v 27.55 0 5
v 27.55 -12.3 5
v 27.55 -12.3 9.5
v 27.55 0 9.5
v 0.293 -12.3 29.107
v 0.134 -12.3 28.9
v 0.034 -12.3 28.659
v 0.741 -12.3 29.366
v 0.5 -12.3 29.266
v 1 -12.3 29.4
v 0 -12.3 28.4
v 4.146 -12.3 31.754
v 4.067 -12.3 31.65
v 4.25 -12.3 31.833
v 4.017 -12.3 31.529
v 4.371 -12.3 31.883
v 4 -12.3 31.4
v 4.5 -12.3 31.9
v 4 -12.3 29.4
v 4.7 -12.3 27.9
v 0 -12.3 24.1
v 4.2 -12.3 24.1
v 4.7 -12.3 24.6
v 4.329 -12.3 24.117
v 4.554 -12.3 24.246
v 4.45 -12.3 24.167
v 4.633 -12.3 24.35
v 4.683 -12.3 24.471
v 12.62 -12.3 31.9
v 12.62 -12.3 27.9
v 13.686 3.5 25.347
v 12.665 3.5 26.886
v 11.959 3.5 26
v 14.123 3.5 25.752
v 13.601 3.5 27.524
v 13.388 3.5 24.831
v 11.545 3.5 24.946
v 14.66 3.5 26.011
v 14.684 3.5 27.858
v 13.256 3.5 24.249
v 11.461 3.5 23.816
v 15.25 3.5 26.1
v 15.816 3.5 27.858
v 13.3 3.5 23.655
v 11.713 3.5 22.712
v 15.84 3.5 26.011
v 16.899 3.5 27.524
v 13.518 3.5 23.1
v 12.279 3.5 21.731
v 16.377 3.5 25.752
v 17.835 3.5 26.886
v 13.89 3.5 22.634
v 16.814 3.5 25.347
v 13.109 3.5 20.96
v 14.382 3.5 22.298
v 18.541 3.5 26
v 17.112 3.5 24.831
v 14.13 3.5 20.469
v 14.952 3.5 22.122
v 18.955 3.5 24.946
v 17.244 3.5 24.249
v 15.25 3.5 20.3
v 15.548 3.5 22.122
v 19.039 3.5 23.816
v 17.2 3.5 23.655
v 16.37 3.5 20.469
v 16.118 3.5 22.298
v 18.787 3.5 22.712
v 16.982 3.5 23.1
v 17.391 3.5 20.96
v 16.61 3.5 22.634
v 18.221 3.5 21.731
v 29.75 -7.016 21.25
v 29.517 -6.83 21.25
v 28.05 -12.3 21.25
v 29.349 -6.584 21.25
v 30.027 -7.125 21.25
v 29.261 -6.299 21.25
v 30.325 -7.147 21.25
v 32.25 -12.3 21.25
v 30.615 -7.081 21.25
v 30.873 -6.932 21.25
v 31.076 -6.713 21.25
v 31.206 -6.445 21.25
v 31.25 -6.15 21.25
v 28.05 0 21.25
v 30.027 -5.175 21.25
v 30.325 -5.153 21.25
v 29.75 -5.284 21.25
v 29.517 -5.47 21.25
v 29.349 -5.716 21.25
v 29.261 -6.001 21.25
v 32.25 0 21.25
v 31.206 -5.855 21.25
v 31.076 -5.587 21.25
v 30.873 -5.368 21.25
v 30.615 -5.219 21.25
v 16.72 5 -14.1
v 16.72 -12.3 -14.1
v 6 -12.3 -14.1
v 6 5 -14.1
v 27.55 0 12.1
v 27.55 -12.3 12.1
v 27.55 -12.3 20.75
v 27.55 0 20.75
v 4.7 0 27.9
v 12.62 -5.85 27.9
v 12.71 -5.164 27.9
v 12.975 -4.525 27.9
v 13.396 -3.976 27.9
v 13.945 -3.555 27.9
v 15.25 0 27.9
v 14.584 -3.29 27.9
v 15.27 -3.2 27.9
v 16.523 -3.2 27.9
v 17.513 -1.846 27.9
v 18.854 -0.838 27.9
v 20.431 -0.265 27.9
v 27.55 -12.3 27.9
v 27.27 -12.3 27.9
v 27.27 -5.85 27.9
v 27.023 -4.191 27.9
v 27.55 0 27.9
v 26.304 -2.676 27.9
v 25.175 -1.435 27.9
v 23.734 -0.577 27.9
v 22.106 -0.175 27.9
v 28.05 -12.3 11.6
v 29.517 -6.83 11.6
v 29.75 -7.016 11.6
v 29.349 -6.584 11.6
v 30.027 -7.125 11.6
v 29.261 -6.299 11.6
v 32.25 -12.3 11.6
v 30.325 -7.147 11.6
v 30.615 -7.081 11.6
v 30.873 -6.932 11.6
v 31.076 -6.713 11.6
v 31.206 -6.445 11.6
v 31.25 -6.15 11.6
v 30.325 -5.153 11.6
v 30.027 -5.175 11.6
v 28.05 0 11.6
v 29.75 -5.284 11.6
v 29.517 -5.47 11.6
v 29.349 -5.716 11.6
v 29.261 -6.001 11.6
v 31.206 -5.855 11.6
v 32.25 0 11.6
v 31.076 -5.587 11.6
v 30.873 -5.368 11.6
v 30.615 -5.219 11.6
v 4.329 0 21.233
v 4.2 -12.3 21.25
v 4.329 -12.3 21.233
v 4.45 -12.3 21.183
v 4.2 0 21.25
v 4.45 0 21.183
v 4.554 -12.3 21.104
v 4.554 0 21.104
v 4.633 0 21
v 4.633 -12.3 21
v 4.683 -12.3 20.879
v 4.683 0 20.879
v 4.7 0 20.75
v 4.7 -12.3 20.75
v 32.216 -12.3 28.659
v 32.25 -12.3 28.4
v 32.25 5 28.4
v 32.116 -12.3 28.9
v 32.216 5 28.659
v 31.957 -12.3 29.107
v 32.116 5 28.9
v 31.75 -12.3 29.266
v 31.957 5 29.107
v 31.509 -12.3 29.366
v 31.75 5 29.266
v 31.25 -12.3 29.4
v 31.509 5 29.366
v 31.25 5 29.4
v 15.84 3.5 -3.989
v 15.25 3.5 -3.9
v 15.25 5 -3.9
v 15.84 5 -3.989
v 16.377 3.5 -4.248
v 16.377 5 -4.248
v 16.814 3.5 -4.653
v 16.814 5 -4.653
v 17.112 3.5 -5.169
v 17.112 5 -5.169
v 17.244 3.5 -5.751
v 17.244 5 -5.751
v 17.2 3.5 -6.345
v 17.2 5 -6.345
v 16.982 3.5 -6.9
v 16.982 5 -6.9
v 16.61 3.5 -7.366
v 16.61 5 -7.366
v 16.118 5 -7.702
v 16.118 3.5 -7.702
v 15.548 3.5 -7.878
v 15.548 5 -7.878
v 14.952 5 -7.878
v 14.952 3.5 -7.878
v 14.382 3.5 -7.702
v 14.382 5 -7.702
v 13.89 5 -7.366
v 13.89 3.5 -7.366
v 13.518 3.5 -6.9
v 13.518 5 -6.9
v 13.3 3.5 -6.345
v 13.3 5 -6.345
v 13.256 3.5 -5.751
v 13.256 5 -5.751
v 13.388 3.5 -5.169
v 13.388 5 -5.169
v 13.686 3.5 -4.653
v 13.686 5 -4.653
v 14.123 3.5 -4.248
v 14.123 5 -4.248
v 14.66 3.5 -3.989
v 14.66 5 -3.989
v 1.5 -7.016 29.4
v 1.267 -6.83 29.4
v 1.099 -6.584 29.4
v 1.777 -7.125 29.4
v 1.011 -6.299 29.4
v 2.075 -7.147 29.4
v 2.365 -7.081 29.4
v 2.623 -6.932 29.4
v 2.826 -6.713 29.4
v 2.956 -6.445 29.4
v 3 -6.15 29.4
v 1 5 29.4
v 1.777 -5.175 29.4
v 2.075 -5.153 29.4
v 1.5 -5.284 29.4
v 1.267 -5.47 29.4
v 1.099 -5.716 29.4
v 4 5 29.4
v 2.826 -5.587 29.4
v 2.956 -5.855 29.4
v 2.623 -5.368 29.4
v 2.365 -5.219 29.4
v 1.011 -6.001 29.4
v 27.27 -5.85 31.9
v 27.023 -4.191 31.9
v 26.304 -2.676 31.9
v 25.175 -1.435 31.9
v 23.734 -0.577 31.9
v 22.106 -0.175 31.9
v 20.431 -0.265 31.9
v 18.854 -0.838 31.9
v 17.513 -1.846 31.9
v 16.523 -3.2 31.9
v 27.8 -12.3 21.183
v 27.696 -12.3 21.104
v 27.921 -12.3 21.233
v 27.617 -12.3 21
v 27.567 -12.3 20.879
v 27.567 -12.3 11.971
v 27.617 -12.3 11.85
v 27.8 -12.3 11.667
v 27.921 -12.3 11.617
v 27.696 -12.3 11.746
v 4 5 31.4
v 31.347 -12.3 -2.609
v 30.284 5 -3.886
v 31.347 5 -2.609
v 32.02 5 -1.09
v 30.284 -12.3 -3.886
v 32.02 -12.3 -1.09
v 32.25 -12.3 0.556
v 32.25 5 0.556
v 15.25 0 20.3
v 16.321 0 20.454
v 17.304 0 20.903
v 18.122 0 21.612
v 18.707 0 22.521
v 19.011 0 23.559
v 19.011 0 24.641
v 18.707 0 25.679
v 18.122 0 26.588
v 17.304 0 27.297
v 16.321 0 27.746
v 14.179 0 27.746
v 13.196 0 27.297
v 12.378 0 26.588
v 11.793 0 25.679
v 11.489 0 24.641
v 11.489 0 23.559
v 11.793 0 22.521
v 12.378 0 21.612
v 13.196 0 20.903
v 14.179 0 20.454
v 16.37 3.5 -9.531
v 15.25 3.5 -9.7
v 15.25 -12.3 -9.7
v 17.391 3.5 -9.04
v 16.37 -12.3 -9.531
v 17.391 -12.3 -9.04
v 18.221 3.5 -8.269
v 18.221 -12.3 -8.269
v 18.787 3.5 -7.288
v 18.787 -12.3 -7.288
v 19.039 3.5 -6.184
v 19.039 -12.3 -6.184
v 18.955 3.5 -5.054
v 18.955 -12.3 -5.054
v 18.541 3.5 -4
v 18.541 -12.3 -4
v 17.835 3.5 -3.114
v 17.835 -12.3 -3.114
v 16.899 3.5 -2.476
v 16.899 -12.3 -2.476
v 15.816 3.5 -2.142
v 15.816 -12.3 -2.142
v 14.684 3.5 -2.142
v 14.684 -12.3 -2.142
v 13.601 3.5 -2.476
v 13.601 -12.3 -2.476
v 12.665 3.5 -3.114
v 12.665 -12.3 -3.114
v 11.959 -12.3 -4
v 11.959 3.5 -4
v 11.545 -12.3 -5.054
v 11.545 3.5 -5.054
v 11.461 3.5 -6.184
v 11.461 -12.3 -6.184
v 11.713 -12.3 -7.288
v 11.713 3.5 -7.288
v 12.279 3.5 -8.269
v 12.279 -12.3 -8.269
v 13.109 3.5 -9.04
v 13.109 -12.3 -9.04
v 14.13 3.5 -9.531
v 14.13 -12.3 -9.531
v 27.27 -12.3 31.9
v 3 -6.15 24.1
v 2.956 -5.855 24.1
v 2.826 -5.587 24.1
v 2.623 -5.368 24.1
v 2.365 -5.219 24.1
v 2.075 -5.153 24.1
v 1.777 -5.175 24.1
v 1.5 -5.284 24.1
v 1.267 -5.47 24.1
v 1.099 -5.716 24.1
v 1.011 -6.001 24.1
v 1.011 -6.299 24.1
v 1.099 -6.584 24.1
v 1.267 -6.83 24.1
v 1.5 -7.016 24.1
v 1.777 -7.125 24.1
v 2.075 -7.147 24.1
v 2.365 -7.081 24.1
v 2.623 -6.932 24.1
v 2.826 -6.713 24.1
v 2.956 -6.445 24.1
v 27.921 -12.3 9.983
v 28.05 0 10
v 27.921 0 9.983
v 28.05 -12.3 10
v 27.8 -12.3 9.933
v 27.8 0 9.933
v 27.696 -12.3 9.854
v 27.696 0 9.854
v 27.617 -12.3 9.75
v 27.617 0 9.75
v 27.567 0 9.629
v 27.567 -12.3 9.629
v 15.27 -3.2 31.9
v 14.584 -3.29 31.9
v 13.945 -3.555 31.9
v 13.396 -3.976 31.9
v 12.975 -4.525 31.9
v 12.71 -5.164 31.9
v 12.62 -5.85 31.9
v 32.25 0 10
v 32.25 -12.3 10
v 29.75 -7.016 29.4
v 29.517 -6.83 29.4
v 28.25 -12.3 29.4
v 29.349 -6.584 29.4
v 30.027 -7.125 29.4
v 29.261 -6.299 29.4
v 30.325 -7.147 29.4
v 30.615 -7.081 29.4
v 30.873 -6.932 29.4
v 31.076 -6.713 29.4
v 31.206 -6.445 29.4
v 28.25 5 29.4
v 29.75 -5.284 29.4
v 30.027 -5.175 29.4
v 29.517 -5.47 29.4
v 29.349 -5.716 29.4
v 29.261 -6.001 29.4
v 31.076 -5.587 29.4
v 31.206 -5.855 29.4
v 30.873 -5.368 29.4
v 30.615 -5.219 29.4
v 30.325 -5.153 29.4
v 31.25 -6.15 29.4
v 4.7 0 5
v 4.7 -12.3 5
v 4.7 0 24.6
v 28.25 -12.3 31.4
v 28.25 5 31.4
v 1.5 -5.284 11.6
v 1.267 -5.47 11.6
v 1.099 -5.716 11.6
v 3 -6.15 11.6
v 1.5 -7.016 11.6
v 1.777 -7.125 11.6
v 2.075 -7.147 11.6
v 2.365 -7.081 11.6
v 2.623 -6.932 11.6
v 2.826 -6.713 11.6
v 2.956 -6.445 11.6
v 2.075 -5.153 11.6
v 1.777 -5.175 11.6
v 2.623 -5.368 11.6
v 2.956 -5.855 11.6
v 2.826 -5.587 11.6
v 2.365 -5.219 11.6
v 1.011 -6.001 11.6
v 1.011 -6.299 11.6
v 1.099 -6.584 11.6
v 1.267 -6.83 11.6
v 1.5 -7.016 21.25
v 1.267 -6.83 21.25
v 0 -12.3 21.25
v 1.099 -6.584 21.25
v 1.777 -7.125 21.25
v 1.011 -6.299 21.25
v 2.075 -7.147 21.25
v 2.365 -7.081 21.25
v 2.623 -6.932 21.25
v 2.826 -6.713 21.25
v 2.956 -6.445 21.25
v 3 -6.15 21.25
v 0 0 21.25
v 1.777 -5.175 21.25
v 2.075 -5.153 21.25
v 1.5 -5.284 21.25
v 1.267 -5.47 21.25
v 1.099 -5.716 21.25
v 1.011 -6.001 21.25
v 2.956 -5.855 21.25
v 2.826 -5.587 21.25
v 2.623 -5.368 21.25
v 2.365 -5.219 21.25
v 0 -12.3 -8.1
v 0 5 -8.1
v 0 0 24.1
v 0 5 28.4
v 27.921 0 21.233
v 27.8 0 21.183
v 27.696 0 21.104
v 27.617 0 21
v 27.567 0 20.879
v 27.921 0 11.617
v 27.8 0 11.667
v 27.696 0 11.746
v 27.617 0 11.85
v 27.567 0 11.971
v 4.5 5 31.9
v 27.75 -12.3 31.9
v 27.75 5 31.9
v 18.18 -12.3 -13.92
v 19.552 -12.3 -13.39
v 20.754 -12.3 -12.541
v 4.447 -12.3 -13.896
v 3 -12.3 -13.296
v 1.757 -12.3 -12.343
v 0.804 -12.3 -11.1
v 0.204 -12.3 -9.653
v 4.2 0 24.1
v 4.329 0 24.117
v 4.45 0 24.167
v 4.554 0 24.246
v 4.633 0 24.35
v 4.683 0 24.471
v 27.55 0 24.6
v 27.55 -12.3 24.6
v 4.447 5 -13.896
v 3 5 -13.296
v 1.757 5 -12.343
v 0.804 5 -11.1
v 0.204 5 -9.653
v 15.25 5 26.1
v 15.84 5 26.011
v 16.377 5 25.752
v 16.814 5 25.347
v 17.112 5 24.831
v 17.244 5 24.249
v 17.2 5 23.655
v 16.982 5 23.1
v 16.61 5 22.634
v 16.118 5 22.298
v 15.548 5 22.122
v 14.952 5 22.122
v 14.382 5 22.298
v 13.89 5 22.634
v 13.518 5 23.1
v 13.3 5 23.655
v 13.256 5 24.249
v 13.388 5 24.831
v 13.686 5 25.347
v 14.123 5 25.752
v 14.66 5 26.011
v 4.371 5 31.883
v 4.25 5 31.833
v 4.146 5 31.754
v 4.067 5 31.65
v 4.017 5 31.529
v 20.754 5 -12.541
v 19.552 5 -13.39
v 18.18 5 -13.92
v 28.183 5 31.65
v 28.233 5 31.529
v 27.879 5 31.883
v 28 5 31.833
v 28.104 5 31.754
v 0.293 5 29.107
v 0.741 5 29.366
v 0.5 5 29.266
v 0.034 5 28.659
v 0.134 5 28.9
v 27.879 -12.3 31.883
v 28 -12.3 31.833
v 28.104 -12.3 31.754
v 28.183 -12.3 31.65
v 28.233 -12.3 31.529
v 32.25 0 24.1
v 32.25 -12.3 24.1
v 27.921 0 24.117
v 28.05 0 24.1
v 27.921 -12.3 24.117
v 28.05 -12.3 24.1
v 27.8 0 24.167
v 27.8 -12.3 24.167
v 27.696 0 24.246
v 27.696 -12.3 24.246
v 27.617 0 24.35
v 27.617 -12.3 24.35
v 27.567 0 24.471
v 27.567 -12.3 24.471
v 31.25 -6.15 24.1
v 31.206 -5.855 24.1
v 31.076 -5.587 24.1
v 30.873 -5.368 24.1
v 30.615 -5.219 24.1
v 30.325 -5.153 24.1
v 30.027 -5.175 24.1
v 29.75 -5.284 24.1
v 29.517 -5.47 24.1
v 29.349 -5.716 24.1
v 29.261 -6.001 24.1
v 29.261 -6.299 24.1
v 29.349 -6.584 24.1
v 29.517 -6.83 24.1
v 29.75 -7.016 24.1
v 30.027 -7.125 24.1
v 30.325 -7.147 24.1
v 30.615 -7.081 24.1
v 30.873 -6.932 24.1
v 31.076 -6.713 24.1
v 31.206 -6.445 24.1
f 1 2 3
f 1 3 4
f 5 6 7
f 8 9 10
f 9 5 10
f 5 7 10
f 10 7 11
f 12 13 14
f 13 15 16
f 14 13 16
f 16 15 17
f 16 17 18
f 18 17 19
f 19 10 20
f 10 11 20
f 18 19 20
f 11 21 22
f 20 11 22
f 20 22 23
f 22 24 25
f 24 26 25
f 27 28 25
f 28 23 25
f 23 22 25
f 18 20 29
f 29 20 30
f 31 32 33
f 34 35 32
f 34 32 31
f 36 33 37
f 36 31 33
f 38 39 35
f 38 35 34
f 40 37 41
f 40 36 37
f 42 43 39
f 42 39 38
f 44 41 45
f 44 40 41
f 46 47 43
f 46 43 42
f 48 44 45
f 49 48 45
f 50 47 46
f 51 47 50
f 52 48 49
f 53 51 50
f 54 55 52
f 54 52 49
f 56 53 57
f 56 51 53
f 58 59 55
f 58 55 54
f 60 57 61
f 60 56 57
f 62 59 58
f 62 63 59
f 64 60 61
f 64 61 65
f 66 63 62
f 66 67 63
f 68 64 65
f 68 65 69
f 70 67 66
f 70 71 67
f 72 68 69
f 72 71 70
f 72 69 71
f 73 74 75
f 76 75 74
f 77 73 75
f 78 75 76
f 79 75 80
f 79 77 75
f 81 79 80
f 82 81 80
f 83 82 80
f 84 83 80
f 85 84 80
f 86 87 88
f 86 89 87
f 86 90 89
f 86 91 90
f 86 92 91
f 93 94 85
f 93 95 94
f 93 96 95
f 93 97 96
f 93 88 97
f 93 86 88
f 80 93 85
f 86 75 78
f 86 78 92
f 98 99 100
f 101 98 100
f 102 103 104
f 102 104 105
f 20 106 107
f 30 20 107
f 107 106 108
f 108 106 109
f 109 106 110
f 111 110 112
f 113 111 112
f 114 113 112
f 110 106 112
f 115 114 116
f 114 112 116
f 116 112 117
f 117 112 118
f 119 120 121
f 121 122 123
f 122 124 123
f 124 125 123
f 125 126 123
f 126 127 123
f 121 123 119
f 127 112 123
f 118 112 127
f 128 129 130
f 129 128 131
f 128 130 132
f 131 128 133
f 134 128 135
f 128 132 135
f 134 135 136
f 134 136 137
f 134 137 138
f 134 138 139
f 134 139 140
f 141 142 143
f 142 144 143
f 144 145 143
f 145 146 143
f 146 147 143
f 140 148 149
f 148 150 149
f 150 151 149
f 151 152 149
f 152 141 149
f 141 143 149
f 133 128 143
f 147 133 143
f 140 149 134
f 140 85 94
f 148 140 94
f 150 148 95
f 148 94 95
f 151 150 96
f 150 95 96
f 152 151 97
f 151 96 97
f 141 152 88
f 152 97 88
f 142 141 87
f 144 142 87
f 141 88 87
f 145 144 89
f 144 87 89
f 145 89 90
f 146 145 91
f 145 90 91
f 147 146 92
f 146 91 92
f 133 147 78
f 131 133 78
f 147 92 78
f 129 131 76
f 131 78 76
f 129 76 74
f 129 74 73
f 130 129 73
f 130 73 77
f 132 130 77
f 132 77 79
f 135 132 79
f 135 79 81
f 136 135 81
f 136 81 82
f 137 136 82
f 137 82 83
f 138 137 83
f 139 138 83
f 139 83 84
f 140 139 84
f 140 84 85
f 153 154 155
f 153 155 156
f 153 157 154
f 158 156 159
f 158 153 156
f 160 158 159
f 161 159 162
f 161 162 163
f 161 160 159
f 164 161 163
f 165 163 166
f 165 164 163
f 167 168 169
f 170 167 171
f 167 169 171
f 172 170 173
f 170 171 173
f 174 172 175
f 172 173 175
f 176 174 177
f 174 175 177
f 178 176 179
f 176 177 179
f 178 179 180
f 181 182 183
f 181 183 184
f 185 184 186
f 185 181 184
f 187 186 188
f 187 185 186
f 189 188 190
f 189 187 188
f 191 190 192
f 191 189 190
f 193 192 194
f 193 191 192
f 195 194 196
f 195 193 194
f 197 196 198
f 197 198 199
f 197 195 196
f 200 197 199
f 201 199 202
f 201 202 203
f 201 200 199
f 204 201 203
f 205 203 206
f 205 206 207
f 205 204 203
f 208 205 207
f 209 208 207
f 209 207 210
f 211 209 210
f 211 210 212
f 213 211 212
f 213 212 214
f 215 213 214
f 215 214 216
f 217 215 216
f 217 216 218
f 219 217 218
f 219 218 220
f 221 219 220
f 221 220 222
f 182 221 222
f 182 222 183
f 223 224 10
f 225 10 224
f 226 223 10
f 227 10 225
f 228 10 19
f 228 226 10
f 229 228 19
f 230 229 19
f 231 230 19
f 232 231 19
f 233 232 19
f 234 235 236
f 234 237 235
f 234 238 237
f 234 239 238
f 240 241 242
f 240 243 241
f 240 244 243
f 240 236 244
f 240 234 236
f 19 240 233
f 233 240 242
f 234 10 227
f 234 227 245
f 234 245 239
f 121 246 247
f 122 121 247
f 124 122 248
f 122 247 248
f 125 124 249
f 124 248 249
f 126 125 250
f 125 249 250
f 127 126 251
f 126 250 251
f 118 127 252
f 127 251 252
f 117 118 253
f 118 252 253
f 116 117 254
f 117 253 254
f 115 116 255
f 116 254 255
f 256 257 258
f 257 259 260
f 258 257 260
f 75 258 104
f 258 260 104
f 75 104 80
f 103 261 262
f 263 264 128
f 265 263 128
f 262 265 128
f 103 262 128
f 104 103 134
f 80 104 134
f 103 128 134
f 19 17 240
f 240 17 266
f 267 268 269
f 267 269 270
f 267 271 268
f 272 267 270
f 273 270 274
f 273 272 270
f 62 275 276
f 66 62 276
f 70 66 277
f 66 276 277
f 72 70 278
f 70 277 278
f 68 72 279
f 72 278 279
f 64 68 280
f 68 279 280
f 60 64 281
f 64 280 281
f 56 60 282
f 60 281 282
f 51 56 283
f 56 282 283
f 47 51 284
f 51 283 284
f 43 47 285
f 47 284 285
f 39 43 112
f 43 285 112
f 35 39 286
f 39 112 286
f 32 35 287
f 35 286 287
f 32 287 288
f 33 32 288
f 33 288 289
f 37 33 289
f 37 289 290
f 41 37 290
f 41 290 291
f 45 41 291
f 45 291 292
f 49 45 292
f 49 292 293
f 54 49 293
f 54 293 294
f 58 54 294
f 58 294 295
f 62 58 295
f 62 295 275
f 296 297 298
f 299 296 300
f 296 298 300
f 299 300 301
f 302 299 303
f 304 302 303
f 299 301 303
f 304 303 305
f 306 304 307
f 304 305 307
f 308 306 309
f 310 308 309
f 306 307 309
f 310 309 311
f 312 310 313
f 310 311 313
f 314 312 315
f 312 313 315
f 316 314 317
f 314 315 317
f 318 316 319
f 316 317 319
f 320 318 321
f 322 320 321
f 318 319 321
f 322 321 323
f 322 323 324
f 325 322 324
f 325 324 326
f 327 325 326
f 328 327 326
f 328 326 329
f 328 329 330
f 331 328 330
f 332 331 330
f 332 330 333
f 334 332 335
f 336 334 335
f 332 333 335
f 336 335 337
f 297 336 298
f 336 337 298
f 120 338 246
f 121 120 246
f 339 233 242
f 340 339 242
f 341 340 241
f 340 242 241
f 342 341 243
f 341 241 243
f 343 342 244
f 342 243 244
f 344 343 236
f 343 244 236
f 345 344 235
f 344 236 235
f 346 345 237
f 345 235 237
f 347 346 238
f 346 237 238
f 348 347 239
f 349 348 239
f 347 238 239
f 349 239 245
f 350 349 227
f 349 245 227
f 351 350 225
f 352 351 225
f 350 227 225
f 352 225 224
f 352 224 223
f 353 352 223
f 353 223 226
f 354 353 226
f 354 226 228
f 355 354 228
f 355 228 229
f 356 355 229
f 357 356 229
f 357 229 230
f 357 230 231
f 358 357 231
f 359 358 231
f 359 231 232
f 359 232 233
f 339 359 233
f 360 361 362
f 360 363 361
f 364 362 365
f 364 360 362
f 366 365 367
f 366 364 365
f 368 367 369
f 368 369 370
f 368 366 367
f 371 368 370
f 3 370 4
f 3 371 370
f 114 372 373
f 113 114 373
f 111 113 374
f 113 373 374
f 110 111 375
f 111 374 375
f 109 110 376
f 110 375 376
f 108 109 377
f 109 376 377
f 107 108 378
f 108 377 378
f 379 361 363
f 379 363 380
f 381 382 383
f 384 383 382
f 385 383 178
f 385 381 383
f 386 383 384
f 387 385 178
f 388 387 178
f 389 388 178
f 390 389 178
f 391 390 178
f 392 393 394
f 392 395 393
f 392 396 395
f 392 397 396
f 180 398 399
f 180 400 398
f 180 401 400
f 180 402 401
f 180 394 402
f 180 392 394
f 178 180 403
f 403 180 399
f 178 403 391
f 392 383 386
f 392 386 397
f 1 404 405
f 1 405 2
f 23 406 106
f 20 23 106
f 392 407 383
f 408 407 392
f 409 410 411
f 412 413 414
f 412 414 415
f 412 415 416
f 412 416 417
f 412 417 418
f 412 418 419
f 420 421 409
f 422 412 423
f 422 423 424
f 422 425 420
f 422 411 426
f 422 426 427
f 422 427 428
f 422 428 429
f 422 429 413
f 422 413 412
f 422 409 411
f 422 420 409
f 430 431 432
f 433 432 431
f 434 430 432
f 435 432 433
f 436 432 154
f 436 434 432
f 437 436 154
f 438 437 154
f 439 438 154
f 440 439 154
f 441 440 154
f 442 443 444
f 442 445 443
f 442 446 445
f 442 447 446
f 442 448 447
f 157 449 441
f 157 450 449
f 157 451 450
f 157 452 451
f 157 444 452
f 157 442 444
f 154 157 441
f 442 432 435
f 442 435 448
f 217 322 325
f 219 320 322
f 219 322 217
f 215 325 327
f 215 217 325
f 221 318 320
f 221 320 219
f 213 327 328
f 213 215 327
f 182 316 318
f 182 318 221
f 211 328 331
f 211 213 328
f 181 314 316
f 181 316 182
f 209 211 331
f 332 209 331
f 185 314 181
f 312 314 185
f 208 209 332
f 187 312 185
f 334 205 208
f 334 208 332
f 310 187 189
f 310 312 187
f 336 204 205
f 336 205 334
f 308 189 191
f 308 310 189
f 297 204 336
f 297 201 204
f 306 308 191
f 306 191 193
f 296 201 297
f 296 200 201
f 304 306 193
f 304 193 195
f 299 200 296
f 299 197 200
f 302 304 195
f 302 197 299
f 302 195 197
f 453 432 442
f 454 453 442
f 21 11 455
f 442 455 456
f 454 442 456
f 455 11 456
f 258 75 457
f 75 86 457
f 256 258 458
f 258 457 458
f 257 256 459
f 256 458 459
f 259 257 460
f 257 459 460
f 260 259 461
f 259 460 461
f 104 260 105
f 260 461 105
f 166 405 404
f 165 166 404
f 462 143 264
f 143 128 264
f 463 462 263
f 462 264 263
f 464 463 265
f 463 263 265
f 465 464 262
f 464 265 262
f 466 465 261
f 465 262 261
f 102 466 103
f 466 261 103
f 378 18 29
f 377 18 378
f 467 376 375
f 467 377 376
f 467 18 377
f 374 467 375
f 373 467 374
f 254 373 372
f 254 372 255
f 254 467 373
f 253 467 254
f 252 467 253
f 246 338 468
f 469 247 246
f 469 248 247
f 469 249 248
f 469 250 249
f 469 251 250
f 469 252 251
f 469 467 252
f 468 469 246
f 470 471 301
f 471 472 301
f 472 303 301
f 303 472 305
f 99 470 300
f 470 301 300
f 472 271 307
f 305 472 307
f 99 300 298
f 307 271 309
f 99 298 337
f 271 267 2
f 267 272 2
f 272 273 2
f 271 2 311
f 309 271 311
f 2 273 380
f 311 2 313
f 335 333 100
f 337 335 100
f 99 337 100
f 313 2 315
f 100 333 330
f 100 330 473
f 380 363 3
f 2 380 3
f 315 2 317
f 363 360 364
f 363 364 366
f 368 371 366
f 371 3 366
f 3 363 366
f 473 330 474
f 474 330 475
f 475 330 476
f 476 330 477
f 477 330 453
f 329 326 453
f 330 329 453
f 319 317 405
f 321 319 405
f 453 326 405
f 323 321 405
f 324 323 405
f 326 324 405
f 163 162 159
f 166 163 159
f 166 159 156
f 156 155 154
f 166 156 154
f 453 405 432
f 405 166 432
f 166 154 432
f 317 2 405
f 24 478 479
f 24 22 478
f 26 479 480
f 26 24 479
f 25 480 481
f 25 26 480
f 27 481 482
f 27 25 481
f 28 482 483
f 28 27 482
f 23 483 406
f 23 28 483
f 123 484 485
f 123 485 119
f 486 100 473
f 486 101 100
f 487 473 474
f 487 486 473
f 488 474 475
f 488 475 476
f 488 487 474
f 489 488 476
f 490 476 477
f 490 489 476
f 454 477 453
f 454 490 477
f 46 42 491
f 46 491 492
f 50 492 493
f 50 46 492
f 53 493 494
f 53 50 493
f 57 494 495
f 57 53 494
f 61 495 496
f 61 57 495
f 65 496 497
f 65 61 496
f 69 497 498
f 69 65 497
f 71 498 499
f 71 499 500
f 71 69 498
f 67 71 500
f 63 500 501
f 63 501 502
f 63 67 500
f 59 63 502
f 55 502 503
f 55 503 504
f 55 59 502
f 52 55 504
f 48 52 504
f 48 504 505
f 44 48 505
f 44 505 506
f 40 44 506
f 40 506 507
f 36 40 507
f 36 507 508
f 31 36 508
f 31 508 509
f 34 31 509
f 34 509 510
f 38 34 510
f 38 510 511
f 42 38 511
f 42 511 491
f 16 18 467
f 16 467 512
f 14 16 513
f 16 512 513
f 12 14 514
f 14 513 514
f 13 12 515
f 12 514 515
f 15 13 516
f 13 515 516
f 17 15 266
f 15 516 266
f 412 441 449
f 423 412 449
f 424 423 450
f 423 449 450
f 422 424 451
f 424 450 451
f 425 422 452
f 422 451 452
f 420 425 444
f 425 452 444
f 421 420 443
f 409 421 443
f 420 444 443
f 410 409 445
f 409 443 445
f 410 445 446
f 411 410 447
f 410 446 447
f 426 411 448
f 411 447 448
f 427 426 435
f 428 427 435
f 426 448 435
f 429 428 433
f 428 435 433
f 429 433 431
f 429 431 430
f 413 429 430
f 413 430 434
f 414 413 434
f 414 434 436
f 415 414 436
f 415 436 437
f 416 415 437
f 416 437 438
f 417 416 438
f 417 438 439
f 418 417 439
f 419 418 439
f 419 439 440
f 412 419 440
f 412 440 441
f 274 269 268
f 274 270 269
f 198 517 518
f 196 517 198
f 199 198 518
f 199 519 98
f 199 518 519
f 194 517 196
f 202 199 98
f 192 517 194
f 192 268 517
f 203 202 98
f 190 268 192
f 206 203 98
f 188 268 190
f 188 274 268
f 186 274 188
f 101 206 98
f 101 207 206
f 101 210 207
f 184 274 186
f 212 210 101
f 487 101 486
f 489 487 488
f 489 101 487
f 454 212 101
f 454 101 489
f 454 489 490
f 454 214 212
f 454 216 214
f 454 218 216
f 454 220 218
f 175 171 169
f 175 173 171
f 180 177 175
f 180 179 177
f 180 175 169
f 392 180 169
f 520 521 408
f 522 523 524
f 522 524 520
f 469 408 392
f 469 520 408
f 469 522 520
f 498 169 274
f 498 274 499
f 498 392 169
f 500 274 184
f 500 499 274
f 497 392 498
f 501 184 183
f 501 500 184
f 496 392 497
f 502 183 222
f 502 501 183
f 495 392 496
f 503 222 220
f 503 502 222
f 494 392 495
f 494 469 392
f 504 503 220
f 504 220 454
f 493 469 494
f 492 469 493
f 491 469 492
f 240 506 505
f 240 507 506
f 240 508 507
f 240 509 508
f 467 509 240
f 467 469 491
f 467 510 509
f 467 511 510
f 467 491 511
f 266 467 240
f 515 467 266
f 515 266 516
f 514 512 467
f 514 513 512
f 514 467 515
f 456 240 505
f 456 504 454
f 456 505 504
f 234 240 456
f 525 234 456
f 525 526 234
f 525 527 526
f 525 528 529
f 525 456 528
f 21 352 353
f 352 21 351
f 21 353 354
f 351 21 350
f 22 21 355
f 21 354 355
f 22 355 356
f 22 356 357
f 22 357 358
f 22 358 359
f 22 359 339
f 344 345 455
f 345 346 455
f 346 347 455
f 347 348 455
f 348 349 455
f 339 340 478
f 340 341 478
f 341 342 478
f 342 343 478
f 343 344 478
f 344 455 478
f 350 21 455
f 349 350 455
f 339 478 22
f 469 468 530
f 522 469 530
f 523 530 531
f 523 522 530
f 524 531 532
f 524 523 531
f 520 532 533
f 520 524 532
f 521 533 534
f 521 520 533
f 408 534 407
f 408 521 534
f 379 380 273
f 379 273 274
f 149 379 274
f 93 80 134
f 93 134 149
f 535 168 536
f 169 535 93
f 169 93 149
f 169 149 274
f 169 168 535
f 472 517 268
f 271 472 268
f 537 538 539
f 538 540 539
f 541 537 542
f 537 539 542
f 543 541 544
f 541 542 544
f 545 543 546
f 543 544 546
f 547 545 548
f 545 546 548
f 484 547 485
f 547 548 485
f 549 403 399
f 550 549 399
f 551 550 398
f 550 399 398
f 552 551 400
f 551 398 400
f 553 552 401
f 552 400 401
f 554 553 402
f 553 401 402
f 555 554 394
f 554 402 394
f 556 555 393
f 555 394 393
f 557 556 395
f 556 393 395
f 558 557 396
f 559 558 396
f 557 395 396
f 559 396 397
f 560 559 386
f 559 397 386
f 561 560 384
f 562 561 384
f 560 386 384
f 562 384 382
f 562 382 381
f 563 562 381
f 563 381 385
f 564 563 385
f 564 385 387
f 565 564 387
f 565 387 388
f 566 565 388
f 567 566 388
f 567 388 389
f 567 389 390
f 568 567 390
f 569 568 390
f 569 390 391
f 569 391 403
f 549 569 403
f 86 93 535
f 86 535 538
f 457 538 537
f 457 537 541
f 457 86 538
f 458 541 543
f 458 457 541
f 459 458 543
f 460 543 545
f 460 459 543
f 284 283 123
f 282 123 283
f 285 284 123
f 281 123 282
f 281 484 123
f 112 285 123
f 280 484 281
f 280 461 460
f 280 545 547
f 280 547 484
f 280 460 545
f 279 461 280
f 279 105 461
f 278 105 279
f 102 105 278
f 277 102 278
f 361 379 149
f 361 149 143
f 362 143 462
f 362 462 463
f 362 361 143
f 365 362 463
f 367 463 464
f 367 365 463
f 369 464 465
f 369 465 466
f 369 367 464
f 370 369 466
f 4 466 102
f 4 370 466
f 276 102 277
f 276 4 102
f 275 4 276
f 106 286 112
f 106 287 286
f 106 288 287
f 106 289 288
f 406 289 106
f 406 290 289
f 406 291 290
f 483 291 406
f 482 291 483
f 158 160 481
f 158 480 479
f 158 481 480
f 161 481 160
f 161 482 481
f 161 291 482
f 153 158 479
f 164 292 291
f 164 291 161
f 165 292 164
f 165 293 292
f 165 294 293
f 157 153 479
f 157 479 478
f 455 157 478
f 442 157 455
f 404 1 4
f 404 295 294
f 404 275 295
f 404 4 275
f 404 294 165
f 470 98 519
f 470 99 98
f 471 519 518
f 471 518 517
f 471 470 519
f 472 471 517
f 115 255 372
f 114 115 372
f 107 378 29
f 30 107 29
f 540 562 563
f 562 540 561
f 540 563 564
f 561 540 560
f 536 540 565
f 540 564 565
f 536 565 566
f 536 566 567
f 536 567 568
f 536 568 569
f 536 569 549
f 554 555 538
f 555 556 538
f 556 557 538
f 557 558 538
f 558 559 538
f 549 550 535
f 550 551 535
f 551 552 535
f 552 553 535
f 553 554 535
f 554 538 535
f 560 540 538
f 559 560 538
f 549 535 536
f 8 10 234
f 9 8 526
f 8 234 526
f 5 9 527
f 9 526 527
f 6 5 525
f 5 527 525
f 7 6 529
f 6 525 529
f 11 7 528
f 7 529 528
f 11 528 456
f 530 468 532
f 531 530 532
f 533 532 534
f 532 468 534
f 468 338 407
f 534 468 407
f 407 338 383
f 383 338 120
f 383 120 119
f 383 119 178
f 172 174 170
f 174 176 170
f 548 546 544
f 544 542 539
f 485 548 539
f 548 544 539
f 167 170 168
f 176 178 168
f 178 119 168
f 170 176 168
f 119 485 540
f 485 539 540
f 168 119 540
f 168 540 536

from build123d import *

# Parameters (mm, degrees)
ESQUISSE1_W              = 32.25
ESQUISSE1_H              = 12.3
BOSS_EXTRU_1_DEPTH       = 5
ESQUISSE2_W              = 4.7
ESQUISSE2_H              = 12.3
BOSS_EXTRU_2_DEPTH       = 16.25
ESQUISSE5_W              = 32.25
ESQUISSE5_H              = 5
BOSS_EXTRU_4_DEPTH       = 27.9
ESQUISSE6_W              = 4.7
ESQUISSE6_H              = 3.8
BOSS_EXTRU_5_DEPTH       = 12.3
ESQUISSE7_W              = 32.25
ESQUISSE7_H              = 17.3
BOSS_EXTRU_6_DEPTH       = 4
ENL_V_MAT_EXTRU_2_DEPTH  = 4.3
ENL_V_START              = -12.3
ESQUISSE9_W              = 4.7
ESQUISSE9_H              = 1.6
ENL_V_MAT_EXTRU_3_DEPTH  = 12.3
ESQUISSE10_R             = 1
ENL_V_MAT_EXTRU_4_DEPTH  = 20.3
ESQUISSE16_W             = 32.25
ESQUISSE16_H             = 17.3
BOSS_EXTRU_8_DEPTH       = 14.1
ENL_V_START_2            = -17.3
ESQUISSE18_R             = 2
ENL_V_MAT_EXTRU_8_DEPTH  = 17.3
CONG_4_R                 = 6
ESQUISSE19_R             = 3.8
ENL_V_MAT_EXTRU_9_DEPTH  = 15.8
ESQUISSE20_W             = 4
ESQUISSE20_H             = 17.3
ENL_V_MAT_EXTRU_10_DEPTH = 2.5
ENL_V_MAT_EXTRU_11_DEPTH = 17.3
CONG_5_R                 = 6
CONG_6_R                 = 6
CONG_7_R                 = 1
CONG_8_R                 = 1
CONG_9_R                 = 0.5
CONG_10_R                = 0.5
CONG_11_R                = 0.5


with BuildPart() as part:
    # Esquisse1 → Boss.-Extru.1 (new body)
    with BuildSketch(Plane.XY):
        with Locations((16.125, -6.15)):
            Rectangle(ESQUISSE1_W, ESQUISSE1_H)
    extrude(amount=BOSS_EXTRU_1_DEPTH)

    # Esquisse2 → Boss.-Extru.2 (add)
    with BuildSketch(Plane.XY.offset(5)):
        with Locations((2.35, -6.15)):
            Rectangle(ESQUISSE2_W, ESQUISSE2_H)
        with Locations((29.9, -6.15)):
            Rectangle(ESQUISSE2_W, ESQUISSE2_H)
    extrude(amount=BOSS_EXTRU_2_DEPTH)

    # Esquisse5 → Boss.-Extru.4 (add)
    with BuildSketch(Plane(origin=(0, 0, 0), x_dir=(-1, 0, 0), z_dir=(0, 0, -1))):
        with Locations((-16.125, 2.5)):
            Rectangle(ESQUISSE5_W, ESQUISSE5_H)
    extrude(amount=-BOSS_EXTRU_4_DEPTH)

    # Esquisse6 → Boss.-Extru.5 (add)
    with BuildSketch(Plane.XZ):
        with Locations((29.9, 26)):
            Rectangle(ESQUISSE6_W, ESQUISSE6_H)
        with Locations((2.35, 26)):
            Rectangle(ESQUISSE6_W, ESQUISSE6_H)
    extrude(amount=BOSS_EXTRU_5_DEPTH)

    # Esquisse7 → Boss.-Extru.6 (add)
    with BuildSketch(Plane.XY.offset(27.9)):
        with Locations((16.125, -3.65)):
            Rectangle(ESQUISSE7_W, ESQUISSE7_H)
    extrude(amount=BOSS_EXTRU_6_DEPTH)

    # Esquisse8 → Enlèv. mat.-Extru.2 (cut)
    with BuildSketch(Plane.XY.offset(31.9)):
        with BuildLine():
            Line((12.62, -5.85), (12.62, -12.3))
            Line((12.62, -12.3), (27.27, -12.3))
            Line((27.27, -12.3), (27.27, -5.85))
            ThreePointArc((27.27, -5.85), (22.934690305, -0.315777347), (16.523466536, -3.2))
            Line((16.523466536, -3.2), (15.27, -3.2))
            ThreePointArc((15.27, -3.2), (13.39616703, -3.97616703), (12.62, -5.85))
        make_face()
    extrude(amount=-ENL_V_MAT_EXTRU_2_DEPTH, mode=Mode.SUBTRACT)

    # Esquisse9 → Enlèv. mat.-Extru.3 (cut)
    with BuildSketch(Plane.XZ.offset(12.3).offset(ENL_V_START)):
        with Locations((29.9, 10.8)):
            Rectangle(ESQUISSE9_W, ESQUISSE9_H)
    extrude(amount=ENL_V_MAT_EXTRU_3_DEPTH, mode=Mode.SUBTRACT)

    # Esquisse10 → Enlèv. mat.-Extru.4 (cut)
    with BuildSketch(Plane.XY.offset(31.9)):
        with Locations((30.25, -6.15)):
            Circle(ESQUISSE10_R)
        with Locations((2, -6.15)):
            Circle(ESQUISSE10_R)
    extrude(amount=-ENL_V_MAT_EXTRU_4_DEPTH, mode=Mode.SUBTRACT)

    # Esquisse16 → Boss.-Extru.8 (add)
    with BuildSketch(Plane(origin=(0, 0, 0), x_dir=(-1, 0, 0), z_dir=(0, 0, -1))):
        with Locations((-16.125, -3.65)):
            Rectangle(ESQUISSE16_W, ESQUISSE16_H)
    extrude(amount=BOSS_EXTRU_8_DEPTH)

    # Esquisse18 → Enlèv. mat.-Extru.8 (cut)
    with BuildSketch(Plane(origin=(0, 5, 0), x_dir=(1, 0, 0), z_dir=(0, 1, 0)).offset(ENL_V_START_2)):
        with Locations(Location((15.25, -24.1, 0), (0, 0, 270))):
            Circle(ESQUISSE18_R)
        with Locations(Location((15.25, 5.9, 0), (0, 0, 270))):
            Circle(ESQUISSE18_R)
    extrude(amount=ENL_V_MAT_EXTRU_8_DEPTH, mode=Mode.SUBTRACT)

    # Congé4
    cong_4_edges = [part.edges().sort_by_distance(p)[0] for p in [
        (0, -3.65, -14.1),
    ]]
    fillet(cong_4_edges, radius=CONG_4_R)

    # Esquisse19 → Enlèv. mat.-Extru.9 (cut)
    with BuildSketch(Plane.XZ.offset(12.3)):
        with Locations(Location((15.25, -5.9, 0), (0, 0, 270))):
            Circle(ESQUISSE19_R)
        with Locations(Location((15.25, 24.1, 0), (0, 0, 270))):
            Circle(ESQUISSE19_R)
    extrude(amount=-ENL_V_MAT_EXTRU_9_DEPTH, mode=Mode.SUBTRACT)

    # Esquisse20 → Enlèv. mat.-Extru.10 (cut)
    with BuildSketch(Plane.XY.offset(31.9)):
        with Locations((2, -3.65)):
            Rectangle(ESQUISSE20_W, ESQUISSE20_H)
        with Locations((30.25, -3.65)):
            Rectangle(ESQUISSE20_W, ESQUISSE20_H)
    extrude(amount=-ENL_V_MAT_EXTRU_10_DEPTH, mode=Mode.SUBTRACT)

    # Esquisse22 → Enlèv. mat.-Extru.11 (cut)
    with BuildSketch(Plane.XZ.offset(12.3).offset(ENL_V_START_2)):
        Polygon((19.038139385, -14.1), (32.25, -2.1), (32.25, -14.1), align=None)
    extrude(amount=ENL_V_MAT_EXTRU_11_DEPTH, mode=Mode.SUBTRACT)

    # Congé5
    cong_5_edges = [part.edges().sort_by_distance(p)[0] for p in [
        (19.038139385, -3.65, -14.1),
    ]]
    fillet(cong_5_edges, radius=CONG_5_R)

    # Congé6
    cong_6_edges = [part.edges().sort_by_distance(p)[0] for p in [
        (32.25, -3.65, -2.1),
    ]]
    fillet(cong_6_edges, radius=CONG_6_R)

    # Congé7
    cong_7_edges = [part.edges().sort_by_distance(p)[0] for p in [
        (32.25, -3.65, 29.4),
    ]]
    fillet(cong_7_edges, radius=CONG_7_R - 0.0001)  # a hair under: the kernel refuses the full size

    # Congé8
    cong_8_edges = [part.edges().sort_by_distance(p)[0] for p in [
        (0, -3.65, 29.4),
    ]]
    fillet(cong_8_edges, radius=CONG_8_R - 0.0001)  # a hair under: the kernel refuses the full size

    # Congé9
    cong_9_edges = [part.edges().sort_by_distance(p)[0] for p in [
        (28.25, -3.65, 31.9),
    ]]
    fillet(cong_9_edges, radius=CONG_9_R)

    # Congé10
    cong_10_edges = [part.edges().sort_by_distance(p)[0] for p in [
        (4, -3.65, 31.9),
    ]]
    fillet(cong_10_edges, radius=CONG_10_R)

    # Congé11
    cong_11_edges = [part.edges().sort_by_distance(p)[0] for p in [
        (27.55, -6.15, 10),
        (27.55, -6.15, 11.6),
        (4.7, -6.15, 21.25),
        (27.55, -6.15, 21.25),
        (27.55, -6.15, 24.1),
        (4.7, -6.15, 24.1),
    ]]
    fillet(cong_11_edges, radius=CONG_11_R)


solid = part.part
